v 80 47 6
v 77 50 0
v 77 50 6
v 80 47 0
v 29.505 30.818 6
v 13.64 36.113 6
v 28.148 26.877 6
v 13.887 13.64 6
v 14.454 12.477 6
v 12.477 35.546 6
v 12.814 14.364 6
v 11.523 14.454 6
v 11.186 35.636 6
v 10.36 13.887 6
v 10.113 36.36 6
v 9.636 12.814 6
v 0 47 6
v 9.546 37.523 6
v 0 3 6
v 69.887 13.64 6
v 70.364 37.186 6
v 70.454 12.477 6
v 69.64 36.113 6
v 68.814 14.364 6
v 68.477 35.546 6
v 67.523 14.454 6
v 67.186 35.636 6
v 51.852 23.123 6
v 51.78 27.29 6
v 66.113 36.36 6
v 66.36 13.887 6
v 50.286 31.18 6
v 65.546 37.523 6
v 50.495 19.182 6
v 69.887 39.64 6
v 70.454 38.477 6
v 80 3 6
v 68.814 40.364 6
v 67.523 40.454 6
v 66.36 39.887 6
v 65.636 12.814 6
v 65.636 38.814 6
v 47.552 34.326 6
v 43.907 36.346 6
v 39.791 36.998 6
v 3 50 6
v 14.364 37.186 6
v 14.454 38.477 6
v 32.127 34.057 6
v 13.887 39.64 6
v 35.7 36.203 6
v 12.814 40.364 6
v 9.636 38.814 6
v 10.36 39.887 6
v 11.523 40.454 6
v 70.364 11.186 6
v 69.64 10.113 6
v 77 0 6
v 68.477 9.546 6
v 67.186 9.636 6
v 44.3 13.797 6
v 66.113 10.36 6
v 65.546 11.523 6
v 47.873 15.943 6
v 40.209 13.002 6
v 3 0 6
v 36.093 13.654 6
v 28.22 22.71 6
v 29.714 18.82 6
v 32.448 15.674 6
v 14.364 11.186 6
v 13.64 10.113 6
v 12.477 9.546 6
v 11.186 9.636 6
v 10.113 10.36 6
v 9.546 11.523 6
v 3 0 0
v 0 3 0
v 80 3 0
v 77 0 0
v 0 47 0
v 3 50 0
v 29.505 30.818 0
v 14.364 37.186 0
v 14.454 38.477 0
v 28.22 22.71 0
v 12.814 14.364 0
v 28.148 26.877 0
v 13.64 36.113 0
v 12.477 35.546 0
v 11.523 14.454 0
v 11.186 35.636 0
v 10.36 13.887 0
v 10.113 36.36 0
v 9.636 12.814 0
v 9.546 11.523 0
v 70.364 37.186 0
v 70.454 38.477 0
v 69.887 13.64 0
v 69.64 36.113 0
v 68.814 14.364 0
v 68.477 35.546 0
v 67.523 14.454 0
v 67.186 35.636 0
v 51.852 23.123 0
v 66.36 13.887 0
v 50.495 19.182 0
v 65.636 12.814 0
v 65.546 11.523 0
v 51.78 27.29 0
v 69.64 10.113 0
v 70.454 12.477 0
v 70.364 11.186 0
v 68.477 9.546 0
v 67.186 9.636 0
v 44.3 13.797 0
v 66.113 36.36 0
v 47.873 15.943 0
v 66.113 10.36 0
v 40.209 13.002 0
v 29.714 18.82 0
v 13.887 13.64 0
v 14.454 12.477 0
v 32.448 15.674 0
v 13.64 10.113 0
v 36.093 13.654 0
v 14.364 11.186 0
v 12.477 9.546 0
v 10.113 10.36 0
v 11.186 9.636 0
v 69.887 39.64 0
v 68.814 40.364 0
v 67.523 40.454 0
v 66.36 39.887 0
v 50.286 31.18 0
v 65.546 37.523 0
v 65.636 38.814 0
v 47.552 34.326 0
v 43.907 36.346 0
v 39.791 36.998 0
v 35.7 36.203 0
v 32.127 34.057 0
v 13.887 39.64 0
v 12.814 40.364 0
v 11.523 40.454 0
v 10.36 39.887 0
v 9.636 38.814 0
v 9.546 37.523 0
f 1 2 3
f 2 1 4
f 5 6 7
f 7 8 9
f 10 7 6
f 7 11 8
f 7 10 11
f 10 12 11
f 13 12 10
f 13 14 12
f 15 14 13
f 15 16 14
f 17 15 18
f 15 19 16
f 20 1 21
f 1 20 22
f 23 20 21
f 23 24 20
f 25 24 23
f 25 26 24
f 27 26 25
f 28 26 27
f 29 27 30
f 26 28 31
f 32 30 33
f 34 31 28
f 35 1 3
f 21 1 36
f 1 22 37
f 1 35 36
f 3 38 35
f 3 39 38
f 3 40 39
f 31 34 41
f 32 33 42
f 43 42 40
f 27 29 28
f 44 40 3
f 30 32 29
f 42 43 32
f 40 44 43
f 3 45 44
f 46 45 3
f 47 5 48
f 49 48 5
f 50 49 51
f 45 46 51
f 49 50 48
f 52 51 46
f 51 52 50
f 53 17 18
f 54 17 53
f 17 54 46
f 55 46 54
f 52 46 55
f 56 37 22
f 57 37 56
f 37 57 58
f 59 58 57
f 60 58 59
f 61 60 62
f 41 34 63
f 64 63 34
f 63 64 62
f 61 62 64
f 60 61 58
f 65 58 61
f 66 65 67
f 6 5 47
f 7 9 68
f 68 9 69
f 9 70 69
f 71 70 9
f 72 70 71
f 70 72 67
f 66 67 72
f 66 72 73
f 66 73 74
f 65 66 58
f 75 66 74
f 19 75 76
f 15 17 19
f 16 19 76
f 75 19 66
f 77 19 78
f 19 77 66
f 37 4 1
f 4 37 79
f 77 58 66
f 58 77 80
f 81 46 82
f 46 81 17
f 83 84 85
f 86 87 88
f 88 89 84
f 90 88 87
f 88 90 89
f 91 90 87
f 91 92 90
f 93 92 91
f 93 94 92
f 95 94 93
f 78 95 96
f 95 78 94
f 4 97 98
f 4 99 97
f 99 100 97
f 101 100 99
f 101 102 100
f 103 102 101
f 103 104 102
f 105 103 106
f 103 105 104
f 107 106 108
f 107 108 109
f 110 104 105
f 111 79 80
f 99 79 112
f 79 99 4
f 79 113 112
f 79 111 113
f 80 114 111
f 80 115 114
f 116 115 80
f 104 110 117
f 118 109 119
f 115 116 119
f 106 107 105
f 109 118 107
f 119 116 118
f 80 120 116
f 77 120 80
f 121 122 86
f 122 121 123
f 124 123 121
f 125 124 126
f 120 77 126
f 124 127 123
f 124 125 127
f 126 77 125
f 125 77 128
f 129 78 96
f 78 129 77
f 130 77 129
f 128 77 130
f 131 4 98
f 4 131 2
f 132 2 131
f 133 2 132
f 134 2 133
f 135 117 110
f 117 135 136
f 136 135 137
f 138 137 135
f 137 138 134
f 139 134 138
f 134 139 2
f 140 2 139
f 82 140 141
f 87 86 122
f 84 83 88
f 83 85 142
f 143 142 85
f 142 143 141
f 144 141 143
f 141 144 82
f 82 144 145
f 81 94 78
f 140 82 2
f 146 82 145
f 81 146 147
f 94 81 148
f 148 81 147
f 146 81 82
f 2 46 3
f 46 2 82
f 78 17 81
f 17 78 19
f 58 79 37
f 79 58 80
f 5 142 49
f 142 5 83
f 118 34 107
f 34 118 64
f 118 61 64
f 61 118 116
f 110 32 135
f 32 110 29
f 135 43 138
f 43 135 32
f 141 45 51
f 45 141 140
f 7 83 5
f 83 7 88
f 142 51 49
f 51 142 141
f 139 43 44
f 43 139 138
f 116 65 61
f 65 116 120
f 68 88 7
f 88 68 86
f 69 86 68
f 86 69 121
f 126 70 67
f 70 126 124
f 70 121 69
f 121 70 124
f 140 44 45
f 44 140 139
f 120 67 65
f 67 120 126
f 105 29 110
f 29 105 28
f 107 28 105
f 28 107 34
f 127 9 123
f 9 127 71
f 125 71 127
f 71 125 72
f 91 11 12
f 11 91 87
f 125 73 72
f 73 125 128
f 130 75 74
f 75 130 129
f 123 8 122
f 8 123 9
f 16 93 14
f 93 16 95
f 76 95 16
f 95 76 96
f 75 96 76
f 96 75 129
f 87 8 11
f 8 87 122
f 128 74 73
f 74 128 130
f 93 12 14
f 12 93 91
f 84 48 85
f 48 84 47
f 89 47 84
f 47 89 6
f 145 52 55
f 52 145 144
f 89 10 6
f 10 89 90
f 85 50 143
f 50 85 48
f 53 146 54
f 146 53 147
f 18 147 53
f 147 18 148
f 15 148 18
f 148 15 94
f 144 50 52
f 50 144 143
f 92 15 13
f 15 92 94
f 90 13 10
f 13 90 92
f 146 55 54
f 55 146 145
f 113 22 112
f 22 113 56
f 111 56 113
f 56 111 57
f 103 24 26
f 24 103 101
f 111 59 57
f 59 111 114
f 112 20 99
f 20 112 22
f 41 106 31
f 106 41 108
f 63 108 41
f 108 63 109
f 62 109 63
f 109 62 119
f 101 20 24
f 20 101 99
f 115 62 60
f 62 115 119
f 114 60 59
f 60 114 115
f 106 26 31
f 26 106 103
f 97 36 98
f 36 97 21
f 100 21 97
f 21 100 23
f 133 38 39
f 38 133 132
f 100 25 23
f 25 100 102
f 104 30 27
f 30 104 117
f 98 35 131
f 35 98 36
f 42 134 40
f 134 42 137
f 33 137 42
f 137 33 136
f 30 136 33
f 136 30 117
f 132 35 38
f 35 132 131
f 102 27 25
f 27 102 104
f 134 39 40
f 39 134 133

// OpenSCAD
$fn = 32;

// ----------------------------------------------------------------------
// Spacer plate: rect 80 x 50
// ----------------------------------------------------------------------

// --- parameters (mm) ---
bore_r = 12;              // centre bore radius
bolt_r = 2.5;             // bolt hole radius
plate_t = 6;              // plate thickness, Z (extrusion height)
plate_l = 80;             // plate length, X
plate_w = 50;             // plate width, Y
inset = 12;               // corner hole inset

profile = [[3, 0], [77, 0], [80, 3], [80, 47], [77, 50], [3, 50], [0, 47], [0, 3]];  // primary outline, 8 points, counter clockwise
void_1 = [[51.78, 27.29], [50.286, 31.18], [47.552, 34.326], [43.907, 36.346], [39.791, 36.998], [35.7, 36.203], [32.127, 34.057], [29.505, 30.818], [28.148, 26.877], [28.22, 22.71], [29.714, 18.82], [32.448, 15.674], [36.093, 13.654], [40.209, 13.002], [44.3, 13.797], [47.873, 15.943], [50.495, 19.182], [51.852, 23.123]];  // centre bore, 18 points
void_2 = [[14.454, 12.477], [13.887, 13.64], [12.814, 14.364], [11.523, 14.454], [10.36, 13.887], [9.636, 12.814], [9.546, 11.523], [10.113, 10.36], [11.186, 9.636], [12.477, 9.546], [13.64, 10.113], [14.364, 11.186]];  // corner hole, 12 points
void_3 = [[14.454, 38.477], [13.887, 39.64], [12.814, 40.364], [11.523, 40.454], [10.36, 39.887], [9.636, 38.814], [9.546, 37.523], [10.113, 36.36], [11.186, 35.636], [12.477, 35.546], [13.64, 36.113], [14.364, 37.186]];  // corner hole, 12 points
void_4 = [[70.454, 12.477], [69.887, 13.64], [68.814, 14.364], [67.523, 14.454], [66.36, 13.887], [65.636, 12.814], [65.546, 11.523], [66.113, 10.36], [67.186, 9.636], [68.477, 9.546], [69.64, 10.113], [70.364, 11.186]];  // corner hole, 12 points
void_5 = [[70.454, 38.477], [69.887, 39.64], [68.814, 40.364], [67.523, 40.454], [66.36, 39.887], [65.636, 38.814], [65.546, 37.523], [66.113, 36.36], [67.186, 35.636], [68.477, 35.546], [69.64, 36.113], [70.364, 37.186]];  // corner hole, 12 points

// --- the one profile operation ---
difference() {
  linear_extrude(height = plate_t) polygon(points = profile);
  translate([0, 0, -1])
    linear_extrude(height = plate_t + 2) polygon(points = void_1);
  translate([0, 0, -1])
    linear_extrude(height = plate_t + 2) polygon(points = void_2);
  translate([0, 0, -1])
    linear_extrude(height = plate_t + 2) polygon(points = void_3);
  translate([0, 0, -1])
    linear_extrude(height = plate_t + 2) polygon(points = void_4);
  translate([0, 0, -1])
    linear_extrude(height = plate_t + 2) polygon(points = void_5);
}
